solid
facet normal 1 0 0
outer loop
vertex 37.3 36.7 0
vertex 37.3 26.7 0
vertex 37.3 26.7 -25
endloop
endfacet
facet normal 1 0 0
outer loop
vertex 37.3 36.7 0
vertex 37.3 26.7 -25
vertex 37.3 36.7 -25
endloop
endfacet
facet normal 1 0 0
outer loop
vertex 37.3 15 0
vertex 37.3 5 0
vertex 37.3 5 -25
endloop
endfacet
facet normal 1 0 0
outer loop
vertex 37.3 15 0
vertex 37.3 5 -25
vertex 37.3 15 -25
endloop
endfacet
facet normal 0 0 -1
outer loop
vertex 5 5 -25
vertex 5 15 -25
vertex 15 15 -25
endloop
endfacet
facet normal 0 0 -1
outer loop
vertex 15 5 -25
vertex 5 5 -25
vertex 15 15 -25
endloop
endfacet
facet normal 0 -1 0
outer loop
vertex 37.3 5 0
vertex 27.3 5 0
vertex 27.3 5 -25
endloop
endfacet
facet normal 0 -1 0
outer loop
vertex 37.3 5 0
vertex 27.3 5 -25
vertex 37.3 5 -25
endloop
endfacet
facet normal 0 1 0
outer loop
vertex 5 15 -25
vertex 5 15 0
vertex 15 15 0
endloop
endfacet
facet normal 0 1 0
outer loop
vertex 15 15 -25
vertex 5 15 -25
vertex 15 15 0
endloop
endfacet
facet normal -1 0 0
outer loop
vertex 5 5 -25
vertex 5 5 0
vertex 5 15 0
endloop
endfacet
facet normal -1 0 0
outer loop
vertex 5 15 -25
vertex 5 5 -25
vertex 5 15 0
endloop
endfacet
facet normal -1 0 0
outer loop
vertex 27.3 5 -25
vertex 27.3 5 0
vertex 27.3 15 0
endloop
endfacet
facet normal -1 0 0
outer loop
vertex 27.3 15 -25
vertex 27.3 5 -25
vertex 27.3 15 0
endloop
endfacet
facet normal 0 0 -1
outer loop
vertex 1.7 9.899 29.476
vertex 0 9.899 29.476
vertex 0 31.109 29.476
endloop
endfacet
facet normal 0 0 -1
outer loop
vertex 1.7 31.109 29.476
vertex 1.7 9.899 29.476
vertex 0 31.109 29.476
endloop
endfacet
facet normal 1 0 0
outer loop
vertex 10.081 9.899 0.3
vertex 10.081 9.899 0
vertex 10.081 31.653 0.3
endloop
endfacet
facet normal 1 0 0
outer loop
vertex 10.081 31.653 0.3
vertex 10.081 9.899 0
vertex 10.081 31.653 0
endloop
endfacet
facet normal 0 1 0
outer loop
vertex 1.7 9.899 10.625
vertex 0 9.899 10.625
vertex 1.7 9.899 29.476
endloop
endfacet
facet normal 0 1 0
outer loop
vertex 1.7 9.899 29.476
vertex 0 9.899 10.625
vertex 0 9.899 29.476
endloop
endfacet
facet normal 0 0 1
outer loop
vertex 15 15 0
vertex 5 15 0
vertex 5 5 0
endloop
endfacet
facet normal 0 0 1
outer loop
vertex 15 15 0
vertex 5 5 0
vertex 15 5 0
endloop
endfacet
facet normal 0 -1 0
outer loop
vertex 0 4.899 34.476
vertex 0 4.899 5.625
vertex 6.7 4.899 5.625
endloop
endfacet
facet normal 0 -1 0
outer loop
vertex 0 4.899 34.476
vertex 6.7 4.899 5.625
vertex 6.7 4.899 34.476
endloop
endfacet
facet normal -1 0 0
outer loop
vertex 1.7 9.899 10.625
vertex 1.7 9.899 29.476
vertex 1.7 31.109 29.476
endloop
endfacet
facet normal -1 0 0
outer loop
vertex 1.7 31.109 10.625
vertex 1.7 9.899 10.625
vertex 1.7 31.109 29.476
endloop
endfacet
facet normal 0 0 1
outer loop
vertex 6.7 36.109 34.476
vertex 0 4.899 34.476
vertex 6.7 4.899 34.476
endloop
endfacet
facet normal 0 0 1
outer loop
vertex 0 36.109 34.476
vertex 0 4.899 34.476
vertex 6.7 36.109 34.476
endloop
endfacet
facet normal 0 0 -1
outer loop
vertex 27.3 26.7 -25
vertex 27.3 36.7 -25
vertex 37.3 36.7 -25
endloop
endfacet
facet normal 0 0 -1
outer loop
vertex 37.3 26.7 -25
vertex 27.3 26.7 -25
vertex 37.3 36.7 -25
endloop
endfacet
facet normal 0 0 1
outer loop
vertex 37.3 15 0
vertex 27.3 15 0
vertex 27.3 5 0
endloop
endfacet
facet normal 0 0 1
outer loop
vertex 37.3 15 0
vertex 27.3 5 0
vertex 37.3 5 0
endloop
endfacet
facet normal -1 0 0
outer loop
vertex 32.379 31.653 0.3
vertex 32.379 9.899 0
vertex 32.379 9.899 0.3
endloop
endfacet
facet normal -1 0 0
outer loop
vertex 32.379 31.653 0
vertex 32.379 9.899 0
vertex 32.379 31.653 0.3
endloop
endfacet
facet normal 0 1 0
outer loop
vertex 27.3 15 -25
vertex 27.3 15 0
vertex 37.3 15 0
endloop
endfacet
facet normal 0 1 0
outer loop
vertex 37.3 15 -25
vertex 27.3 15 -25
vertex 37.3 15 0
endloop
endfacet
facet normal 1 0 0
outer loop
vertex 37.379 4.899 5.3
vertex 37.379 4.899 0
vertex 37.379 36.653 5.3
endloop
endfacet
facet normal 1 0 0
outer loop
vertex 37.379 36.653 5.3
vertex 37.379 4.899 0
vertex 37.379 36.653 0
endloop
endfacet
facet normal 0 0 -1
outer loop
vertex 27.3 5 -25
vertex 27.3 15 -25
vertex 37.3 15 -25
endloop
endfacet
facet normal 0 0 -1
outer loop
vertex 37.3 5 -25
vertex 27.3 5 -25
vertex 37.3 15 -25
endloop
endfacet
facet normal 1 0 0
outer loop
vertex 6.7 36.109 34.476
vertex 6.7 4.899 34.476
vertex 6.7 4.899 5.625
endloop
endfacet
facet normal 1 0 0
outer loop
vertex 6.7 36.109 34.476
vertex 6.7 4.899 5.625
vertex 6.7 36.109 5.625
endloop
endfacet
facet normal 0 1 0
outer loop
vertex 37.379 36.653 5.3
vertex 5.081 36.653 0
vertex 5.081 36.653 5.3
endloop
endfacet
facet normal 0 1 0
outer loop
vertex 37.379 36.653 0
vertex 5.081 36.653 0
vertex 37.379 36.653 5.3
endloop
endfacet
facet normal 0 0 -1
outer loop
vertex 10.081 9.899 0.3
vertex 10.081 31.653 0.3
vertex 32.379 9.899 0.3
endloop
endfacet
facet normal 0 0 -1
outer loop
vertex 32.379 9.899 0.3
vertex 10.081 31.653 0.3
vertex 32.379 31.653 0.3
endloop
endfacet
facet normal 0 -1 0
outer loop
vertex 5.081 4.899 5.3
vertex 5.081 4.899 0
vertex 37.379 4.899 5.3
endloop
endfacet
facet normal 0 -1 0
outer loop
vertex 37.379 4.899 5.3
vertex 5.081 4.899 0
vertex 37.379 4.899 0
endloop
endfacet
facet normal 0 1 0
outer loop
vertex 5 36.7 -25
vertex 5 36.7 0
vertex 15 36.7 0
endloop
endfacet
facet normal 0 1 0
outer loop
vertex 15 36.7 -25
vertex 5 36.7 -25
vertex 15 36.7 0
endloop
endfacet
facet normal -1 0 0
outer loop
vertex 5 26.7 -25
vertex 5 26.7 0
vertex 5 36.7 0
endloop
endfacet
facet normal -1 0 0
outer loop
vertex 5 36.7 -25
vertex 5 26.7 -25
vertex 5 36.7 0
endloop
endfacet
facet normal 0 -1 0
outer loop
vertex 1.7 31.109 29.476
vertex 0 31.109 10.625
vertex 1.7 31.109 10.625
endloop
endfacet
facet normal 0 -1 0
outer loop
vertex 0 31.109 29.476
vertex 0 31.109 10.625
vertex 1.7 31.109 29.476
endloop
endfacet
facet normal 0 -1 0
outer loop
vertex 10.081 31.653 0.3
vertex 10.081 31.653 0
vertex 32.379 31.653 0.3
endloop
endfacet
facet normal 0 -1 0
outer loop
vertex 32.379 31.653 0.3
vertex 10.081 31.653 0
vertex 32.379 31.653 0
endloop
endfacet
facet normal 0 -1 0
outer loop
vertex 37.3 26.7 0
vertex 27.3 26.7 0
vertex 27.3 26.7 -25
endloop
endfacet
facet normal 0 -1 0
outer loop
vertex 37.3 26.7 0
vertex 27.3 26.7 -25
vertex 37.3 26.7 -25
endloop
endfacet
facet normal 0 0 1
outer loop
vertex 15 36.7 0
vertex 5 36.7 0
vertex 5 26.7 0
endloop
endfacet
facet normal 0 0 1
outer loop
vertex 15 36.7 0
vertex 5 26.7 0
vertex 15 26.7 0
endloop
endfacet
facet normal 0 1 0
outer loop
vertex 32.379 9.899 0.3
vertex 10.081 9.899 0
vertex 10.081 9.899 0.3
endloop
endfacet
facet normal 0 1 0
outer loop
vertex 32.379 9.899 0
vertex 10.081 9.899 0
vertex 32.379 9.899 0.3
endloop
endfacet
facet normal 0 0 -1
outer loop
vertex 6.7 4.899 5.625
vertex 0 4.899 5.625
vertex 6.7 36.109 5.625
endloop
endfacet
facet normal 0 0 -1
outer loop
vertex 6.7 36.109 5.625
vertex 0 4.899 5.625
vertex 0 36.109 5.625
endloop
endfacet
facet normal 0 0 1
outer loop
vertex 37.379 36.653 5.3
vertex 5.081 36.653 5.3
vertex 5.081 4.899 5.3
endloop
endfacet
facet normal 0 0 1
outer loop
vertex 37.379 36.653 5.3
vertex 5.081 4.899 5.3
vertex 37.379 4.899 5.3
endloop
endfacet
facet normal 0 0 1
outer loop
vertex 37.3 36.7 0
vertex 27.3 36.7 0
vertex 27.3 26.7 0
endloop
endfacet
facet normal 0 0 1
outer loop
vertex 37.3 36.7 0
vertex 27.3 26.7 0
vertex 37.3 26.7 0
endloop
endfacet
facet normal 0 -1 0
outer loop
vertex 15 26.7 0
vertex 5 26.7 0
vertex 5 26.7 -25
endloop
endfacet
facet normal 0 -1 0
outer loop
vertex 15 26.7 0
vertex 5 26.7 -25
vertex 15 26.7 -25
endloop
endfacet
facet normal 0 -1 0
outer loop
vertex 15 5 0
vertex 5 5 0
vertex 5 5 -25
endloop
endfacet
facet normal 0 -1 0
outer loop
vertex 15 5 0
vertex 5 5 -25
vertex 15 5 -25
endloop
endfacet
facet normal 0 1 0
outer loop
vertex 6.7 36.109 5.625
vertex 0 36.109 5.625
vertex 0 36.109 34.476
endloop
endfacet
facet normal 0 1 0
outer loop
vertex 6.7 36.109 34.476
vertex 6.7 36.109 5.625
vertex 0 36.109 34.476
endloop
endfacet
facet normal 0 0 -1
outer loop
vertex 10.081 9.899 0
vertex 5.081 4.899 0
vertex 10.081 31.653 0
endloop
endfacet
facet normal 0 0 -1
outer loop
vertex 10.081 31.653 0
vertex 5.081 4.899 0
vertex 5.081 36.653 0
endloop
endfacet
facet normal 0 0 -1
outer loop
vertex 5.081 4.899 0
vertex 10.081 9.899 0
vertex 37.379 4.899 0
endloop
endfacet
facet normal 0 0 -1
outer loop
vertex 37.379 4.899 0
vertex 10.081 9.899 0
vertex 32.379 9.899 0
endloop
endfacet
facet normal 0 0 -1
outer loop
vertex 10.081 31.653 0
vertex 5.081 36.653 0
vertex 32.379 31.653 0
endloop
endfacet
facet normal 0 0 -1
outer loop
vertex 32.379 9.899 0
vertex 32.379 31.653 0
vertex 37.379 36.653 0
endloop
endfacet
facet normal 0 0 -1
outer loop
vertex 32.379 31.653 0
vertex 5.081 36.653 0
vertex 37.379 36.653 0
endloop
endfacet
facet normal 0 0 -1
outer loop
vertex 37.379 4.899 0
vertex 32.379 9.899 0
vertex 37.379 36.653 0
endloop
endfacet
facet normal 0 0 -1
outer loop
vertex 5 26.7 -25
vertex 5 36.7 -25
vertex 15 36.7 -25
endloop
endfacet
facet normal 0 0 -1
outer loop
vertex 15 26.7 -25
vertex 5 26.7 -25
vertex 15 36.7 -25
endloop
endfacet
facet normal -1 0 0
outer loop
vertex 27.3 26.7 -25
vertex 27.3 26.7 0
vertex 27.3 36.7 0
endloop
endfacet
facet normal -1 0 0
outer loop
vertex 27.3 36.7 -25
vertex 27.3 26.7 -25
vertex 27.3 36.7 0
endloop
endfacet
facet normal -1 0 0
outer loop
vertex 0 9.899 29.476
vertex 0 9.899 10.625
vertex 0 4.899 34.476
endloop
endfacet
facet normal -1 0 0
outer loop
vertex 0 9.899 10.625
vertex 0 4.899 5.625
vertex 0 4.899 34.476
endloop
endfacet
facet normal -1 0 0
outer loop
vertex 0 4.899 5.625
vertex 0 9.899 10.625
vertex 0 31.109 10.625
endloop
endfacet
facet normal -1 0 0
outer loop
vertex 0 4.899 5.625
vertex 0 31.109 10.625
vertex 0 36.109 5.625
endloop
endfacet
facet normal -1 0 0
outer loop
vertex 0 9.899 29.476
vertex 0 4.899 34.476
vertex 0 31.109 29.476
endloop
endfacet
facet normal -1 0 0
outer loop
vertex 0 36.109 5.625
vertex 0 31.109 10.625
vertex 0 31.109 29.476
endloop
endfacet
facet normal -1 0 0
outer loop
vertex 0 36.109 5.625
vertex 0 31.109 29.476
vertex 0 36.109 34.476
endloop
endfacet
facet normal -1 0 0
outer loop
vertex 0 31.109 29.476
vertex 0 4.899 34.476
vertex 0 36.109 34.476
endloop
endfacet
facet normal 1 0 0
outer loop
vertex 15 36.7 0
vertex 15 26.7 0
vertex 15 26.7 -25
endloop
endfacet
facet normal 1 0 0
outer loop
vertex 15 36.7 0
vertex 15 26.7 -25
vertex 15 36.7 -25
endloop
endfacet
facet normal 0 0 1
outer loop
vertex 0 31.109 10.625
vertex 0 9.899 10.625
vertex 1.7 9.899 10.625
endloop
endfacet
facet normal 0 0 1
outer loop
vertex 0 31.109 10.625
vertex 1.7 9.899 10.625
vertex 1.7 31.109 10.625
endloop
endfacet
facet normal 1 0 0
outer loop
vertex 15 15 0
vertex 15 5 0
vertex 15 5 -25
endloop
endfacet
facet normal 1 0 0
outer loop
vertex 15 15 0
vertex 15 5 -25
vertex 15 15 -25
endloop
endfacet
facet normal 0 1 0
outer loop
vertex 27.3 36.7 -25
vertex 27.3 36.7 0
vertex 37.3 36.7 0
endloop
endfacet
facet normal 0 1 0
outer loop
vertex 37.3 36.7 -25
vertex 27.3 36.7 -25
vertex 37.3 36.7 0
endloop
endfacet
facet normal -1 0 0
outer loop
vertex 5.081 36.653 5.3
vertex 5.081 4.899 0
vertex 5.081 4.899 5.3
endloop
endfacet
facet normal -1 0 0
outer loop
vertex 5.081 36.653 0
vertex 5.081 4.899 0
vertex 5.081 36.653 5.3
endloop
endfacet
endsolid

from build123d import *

# Parameters (mm, degrees)
F0_W     = 10
F0_H     = 10
F1_DEPTH = 25
F2_W     = 32.298388
F2_H     = 31.754034
F3_DEPTH = 5.3
F4_W     = 31.209677
F4_H     = 28.850806
F5_DEPTH = 6.7
F6_T     = -5
F7_T     = -5


with BuildPart() as f1:
    # F0 (on Top) → F1 (new body)
    with BuildSketch(Plane.XY):
        with Locations((10, 10)):
            Rectangle(F0_W, F0_H)
        with Locations((10, 31.7)):
            Rectangle(F0_W, F0_H)
        with Locations((32.3, 10)):
            Rectangle(F0_W, F0_H)
        with Locations((32.3, 31.7)):
            Rectangle(F0_W, F0_H)
    extrude(amount=-F1_DEPTH)


with BuildPart() as f3:
    # F2 (on Top) → F3 (new body)
    with BuildSketch(Plane.XY):
        with Locations((21.22984, 20.776211)):
            Rectangle(F2_W, F2_H)
    extrude(amount=F3_DEPTH)

    # F7
    f7_openings = [f3.faces().sort_by_distance(p)[0] for p in [
        (21.22984, 20.776211, 0),
    ]]
    offset(amount=F7_T, openings=f7_openings)


with BuildPart() as f5:
    # F4 (on Right) → F5 (new body)
    with BuildSketch(Plane.YZ):
        with Locations((20.504031, 20.050404)):
            Rectangle(F4_W, F4_H)
    extrude(amount=F5_DEPTH)

    # F6
    f6_openings = [f5.faces().sort_by_distance(p)[0] for p in [
        (0, 20.504031, 20.050404),
    ]]
    offset(amount=F6_T, openings=f6_openings)


solid = Compound([f1.part, f3.part, f5.part])
